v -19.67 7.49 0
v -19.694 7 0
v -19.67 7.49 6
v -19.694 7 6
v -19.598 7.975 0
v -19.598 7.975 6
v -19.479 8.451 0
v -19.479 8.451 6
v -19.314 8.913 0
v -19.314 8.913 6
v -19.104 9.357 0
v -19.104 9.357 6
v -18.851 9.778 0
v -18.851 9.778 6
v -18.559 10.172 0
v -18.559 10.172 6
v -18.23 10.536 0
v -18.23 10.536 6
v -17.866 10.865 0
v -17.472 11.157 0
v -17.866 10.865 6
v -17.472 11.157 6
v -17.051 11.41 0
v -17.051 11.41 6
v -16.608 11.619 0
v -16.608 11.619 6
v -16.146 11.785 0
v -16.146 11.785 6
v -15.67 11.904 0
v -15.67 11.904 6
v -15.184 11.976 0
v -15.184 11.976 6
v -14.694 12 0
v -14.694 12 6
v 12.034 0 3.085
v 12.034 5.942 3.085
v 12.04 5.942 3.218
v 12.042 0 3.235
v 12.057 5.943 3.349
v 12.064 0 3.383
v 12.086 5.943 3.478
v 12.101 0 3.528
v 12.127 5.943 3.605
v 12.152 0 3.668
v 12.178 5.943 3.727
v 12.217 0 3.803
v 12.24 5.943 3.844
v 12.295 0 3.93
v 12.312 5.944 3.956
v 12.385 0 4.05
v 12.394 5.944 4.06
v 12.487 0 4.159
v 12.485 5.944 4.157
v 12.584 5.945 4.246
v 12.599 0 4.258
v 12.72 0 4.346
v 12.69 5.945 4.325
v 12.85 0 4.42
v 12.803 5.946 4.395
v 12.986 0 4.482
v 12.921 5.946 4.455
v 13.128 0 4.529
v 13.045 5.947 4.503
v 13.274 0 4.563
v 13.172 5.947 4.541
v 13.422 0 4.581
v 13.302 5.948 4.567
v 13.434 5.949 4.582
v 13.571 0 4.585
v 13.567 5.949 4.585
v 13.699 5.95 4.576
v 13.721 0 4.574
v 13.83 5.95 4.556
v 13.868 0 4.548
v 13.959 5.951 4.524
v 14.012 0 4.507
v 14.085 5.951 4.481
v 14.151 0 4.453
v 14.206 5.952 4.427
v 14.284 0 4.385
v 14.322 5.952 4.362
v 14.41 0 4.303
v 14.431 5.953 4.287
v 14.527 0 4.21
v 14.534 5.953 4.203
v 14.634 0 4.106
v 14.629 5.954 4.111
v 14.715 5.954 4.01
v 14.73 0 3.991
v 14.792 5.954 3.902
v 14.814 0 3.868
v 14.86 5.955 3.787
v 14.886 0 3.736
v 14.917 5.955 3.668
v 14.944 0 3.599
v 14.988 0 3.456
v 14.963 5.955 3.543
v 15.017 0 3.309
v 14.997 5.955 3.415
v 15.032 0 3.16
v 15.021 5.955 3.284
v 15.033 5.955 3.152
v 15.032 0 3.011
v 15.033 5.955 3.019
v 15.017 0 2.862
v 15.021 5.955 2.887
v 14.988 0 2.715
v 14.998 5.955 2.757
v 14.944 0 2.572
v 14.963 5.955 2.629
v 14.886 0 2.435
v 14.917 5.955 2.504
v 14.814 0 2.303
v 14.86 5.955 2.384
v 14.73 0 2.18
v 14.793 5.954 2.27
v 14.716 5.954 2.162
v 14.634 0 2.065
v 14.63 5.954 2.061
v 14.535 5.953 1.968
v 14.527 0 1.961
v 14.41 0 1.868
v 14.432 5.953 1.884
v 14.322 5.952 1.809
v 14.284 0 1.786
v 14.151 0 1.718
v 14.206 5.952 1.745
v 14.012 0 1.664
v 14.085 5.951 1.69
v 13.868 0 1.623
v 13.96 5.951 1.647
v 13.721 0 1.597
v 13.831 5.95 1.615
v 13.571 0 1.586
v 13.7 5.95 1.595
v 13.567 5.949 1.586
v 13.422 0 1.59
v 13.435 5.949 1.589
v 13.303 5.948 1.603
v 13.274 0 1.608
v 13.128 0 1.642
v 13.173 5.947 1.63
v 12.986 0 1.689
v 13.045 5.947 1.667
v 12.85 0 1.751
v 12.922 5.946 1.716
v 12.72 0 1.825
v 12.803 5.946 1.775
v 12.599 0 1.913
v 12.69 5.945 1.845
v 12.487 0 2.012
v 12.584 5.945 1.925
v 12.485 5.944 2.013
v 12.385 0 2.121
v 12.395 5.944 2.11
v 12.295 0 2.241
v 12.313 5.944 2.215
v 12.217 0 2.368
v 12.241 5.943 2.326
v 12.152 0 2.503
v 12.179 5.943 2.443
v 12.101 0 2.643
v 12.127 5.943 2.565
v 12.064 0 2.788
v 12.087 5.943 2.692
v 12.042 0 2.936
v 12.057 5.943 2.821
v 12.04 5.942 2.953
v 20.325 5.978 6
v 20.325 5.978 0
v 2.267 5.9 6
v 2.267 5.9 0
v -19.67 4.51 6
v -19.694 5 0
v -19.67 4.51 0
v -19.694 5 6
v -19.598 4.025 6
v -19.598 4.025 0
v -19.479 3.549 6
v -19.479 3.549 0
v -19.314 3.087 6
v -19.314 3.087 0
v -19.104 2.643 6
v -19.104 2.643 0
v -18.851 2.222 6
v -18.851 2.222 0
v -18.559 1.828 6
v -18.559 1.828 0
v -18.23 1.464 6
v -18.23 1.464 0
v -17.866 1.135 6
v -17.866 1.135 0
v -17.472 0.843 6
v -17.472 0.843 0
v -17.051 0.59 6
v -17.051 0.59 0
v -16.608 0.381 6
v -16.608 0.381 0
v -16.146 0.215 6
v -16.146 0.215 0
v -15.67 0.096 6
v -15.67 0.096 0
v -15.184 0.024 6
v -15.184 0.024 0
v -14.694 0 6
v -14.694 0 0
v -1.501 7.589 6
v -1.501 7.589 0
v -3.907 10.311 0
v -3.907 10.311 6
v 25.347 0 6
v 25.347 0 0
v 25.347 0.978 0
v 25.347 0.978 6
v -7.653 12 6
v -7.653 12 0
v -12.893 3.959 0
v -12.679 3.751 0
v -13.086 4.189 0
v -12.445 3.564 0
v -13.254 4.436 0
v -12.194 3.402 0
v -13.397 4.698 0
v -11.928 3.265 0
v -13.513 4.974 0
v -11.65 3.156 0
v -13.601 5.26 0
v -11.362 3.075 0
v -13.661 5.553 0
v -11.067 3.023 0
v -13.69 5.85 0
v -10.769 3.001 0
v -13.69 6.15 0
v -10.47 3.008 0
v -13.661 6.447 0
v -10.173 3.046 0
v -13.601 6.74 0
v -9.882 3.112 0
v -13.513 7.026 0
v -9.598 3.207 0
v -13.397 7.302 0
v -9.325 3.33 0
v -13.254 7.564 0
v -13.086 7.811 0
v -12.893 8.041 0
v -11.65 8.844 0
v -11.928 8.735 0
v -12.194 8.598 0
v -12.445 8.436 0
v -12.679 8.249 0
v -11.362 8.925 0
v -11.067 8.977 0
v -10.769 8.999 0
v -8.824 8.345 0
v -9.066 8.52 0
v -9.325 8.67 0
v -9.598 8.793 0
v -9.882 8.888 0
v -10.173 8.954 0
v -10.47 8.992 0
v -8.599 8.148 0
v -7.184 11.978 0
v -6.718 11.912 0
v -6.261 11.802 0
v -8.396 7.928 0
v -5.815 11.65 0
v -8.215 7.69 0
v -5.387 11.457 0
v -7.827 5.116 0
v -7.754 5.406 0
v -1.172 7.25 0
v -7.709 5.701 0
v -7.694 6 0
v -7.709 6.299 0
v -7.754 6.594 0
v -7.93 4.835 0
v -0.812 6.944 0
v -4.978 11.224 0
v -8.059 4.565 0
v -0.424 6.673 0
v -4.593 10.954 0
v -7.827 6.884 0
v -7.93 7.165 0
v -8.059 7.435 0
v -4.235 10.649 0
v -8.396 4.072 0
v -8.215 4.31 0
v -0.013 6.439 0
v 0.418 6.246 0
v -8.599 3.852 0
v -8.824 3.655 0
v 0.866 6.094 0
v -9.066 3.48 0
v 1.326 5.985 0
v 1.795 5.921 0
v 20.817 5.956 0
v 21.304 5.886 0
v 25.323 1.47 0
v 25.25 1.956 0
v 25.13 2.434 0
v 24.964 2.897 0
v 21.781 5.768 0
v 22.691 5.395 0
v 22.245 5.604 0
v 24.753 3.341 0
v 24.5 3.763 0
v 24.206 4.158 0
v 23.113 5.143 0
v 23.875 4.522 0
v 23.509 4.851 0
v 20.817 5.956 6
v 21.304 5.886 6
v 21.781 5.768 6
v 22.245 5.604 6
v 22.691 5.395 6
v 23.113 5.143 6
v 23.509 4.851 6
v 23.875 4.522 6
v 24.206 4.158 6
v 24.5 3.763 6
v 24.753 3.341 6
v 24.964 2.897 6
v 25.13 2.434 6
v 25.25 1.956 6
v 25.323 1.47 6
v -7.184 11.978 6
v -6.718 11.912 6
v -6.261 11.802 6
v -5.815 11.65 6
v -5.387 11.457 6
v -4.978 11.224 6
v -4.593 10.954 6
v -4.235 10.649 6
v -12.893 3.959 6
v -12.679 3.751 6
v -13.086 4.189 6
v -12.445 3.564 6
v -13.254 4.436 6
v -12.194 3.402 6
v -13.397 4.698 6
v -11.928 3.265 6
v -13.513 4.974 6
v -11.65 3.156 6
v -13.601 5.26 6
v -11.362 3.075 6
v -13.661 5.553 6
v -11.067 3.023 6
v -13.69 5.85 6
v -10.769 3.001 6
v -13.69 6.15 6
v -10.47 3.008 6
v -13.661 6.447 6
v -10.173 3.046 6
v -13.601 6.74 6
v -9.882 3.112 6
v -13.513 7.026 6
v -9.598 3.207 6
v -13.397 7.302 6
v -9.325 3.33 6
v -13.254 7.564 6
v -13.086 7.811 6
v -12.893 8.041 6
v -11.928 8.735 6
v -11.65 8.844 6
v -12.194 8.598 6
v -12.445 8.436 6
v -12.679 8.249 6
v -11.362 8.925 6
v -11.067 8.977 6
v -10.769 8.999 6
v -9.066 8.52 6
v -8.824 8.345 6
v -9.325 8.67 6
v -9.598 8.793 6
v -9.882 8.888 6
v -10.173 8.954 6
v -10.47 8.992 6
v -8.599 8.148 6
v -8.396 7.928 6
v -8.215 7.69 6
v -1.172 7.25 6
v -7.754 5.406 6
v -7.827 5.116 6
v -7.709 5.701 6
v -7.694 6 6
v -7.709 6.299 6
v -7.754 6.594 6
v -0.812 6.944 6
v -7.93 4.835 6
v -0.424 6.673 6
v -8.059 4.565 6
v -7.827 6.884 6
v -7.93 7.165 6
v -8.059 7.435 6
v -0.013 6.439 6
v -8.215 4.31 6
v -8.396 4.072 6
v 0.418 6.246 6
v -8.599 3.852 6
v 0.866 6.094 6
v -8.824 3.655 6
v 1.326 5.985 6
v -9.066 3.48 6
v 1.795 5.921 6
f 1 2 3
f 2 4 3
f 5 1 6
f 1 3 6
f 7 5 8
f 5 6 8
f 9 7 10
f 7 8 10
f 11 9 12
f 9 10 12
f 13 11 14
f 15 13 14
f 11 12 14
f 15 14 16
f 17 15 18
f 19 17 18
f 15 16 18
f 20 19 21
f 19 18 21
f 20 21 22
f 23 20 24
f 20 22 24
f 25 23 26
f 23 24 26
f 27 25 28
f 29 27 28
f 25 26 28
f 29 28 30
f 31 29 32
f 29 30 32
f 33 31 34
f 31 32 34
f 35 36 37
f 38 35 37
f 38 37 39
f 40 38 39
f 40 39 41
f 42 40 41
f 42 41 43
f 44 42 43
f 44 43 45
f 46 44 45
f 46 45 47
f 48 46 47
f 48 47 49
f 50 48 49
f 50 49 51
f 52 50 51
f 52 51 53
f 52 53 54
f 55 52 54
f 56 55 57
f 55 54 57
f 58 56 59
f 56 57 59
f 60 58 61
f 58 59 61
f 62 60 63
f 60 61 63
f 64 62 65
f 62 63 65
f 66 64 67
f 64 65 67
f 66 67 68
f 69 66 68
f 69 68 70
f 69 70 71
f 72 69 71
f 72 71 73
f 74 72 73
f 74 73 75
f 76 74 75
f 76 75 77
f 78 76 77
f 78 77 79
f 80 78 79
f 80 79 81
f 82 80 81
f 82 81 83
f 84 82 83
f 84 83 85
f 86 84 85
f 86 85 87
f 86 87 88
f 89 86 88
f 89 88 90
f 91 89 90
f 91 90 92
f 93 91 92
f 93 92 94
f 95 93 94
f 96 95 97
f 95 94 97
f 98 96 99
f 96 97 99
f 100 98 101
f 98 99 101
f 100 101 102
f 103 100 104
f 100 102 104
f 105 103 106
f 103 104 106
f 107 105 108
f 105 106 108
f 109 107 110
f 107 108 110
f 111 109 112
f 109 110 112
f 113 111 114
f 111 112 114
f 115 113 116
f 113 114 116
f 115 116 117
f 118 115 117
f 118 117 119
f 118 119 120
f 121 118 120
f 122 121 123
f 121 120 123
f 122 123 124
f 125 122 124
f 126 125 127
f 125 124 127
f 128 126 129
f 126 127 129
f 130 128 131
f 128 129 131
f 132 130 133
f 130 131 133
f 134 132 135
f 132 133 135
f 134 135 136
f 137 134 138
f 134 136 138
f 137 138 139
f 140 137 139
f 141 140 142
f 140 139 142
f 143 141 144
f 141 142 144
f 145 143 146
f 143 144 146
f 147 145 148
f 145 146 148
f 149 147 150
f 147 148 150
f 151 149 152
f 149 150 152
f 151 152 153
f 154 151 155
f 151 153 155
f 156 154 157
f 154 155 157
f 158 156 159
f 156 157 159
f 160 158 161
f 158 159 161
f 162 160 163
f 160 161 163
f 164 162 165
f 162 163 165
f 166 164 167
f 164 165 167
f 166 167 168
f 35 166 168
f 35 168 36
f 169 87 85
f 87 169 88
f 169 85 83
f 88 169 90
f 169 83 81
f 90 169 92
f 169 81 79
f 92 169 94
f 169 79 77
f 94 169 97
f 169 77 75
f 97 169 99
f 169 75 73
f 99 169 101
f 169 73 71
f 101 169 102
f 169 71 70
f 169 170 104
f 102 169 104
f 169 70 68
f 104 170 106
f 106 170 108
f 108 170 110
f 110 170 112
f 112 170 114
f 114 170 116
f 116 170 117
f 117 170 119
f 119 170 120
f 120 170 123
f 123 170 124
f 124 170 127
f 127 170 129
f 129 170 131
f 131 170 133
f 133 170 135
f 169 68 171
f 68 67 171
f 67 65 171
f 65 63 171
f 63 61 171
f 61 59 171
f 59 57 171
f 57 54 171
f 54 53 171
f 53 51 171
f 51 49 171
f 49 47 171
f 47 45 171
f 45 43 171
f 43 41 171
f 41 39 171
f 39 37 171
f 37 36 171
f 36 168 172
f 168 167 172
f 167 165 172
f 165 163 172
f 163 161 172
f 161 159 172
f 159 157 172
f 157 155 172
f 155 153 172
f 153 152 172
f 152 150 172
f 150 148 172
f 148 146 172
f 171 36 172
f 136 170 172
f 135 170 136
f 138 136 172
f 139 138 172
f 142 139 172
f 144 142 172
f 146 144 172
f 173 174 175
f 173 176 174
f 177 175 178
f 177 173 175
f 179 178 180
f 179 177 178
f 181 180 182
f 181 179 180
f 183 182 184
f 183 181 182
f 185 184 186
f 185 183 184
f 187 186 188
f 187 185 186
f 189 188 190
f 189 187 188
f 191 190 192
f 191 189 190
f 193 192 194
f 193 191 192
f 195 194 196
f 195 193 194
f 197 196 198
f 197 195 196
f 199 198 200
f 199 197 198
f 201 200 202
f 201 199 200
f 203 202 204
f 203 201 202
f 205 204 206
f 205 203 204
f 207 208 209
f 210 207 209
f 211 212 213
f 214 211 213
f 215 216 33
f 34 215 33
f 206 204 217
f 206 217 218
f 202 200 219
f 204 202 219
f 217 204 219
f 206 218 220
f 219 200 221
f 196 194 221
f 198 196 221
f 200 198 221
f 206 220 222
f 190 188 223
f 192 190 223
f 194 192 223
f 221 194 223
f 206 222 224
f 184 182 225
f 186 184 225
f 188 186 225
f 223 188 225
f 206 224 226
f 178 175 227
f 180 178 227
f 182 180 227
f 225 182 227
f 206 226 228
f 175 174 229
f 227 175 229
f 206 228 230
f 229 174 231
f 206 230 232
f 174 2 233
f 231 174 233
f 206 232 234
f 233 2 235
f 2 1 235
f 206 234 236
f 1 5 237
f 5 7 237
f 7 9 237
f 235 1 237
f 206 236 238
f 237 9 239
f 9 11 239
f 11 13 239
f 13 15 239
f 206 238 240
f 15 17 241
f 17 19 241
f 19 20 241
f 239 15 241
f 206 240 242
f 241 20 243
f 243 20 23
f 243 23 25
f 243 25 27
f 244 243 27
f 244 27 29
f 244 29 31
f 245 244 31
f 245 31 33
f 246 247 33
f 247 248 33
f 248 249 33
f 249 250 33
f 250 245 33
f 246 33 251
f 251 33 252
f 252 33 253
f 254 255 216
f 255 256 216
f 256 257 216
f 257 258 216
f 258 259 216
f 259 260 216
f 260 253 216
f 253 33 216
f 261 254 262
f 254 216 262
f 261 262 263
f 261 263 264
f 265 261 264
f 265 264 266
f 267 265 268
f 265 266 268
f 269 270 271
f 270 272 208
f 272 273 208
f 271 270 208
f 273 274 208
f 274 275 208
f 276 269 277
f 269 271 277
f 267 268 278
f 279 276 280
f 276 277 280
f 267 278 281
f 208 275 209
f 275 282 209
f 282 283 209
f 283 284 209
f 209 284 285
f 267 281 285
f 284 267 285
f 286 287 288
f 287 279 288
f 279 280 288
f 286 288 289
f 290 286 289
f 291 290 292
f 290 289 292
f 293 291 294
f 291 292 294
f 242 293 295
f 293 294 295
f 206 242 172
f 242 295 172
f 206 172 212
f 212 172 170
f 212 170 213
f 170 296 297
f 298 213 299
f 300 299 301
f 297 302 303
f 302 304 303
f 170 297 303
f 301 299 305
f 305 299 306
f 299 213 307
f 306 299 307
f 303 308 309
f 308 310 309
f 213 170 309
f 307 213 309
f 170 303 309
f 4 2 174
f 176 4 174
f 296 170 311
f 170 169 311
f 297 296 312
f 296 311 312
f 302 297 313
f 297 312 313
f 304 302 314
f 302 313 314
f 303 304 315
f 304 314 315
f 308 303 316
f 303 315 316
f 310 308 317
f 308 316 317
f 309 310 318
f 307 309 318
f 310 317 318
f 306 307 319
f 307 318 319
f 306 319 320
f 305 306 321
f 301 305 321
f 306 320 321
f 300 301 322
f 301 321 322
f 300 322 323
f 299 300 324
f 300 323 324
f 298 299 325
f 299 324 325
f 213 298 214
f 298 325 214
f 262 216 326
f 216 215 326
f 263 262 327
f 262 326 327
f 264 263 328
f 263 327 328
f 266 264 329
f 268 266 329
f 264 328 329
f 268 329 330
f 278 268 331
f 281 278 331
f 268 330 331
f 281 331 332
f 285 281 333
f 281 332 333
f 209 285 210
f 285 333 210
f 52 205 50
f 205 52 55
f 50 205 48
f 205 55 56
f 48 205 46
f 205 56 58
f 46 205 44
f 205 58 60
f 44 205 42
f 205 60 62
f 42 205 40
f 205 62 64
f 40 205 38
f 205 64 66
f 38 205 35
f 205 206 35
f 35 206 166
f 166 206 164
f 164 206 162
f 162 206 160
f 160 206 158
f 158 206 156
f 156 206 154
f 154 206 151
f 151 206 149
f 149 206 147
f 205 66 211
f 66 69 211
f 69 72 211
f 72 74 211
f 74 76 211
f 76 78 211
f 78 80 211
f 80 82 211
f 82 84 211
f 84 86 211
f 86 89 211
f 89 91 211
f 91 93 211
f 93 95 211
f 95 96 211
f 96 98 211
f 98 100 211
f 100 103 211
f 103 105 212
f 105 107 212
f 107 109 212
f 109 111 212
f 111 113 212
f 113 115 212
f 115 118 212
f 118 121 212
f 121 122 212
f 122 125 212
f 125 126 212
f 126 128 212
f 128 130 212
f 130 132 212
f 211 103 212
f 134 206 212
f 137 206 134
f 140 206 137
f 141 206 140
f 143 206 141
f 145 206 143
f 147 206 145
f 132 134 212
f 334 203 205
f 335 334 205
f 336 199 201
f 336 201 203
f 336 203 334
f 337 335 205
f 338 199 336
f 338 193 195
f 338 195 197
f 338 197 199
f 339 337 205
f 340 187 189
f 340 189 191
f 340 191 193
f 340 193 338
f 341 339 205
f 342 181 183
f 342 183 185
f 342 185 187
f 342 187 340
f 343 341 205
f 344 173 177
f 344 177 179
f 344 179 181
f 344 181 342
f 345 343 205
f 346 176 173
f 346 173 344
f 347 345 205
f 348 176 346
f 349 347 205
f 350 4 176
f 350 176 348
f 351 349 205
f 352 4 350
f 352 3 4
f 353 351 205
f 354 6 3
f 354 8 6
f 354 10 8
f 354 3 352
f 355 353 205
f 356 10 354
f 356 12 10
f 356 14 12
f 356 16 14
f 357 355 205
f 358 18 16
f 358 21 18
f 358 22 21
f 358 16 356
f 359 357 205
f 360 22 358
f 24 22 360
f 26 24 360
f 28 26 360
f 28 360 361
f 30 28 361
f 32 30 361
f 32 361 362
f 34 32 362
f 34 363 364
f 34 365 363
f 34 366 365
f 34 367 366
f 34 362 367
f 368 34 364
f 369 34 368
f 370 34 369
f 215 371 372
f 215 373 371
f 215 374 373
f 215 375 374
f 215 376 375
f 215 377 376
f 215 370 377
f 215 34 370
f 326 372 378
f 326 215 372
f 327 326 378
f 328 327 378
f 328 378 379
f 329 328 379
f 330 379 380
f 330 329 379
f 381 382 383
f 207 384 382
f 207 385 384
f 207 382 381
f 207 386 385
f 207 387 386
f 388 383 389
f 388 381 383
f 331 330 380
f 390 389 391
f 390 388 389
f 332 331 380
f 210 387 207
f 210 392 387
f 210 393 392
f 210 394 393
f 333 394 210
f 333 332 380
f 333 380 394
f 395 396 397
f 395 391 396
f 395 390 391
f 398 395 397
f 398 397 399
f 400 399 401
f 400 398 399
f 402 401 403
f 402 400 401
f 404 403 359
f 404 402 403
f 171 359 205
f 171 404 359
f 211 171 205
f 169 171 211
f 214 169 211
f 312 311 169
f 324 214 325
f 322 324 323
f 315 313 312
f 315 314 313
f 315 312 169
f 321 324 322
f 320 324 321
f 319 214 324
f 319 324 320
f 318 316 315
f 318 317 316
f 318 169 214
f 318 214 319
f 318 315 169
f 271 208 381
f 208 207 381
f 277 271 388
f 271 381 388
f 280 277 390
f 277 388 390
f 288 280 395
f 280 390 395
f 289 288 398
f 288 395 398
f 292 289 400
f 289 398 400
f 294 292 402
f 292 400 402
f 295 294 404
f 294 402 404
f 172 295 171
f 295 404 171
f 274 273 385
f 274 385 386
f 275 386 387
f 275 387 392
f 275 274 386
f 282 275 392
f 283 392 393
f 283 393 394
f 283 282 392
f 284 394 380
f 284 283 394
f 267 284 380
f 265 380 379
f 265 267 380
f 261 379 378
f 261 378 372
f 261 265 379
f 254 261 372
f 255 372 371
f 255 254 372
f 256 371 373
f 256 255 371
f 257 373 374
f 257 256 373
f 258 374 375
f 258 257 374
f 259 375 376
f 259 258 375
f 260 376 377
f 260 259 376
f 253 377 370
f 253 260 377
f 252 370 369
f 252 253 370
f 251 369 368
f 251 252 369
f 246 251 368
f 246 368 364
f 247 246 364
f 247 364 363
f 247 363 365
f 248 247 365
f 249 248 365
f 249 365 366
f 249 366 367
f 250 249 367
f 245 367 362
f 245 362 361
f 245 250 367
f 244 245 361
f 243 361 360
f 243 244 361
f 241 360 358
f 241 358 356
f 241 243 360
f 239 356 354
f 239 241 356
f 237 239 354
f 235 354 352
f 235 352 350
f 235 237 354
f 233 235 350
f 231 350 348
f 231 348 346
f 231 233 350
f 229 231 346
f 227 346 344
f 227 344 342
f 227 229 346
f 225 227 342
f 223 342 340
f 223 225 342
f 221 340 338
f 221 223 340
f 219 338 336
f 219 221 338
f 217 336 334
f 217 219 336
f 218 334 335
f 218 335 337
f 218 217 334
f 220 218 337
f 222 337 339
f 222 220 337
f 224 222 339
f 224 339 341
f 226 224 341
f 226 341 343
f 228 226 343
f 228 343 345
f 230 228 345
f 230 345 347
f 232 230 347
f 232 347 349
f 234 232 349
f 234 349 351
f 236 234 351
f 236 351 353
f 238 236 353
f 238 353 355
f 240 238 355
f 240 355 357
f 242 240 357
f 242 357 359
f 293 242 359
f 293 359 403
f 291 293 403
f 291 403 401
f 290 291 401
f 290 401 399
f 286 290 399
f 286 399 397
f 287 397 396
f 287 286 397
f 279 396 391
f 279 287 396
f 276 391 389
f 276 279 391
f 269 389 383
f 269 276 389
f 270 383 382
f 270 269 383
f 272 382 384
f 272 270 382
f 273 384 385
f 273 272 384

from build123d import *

# Parameters (mm, degrees)
F0_R     = 3
F2_DEPTH = 6
F3_D     = 3
F4_R     = 5
F5_R     = 5
F6_R     = 5
F7_R     = 5


with BuildPart() as f2:
    # F0 (on Top) → F2 (new body)
    with BuildSketch(Plane.XY):
        Polygon((-19.694119, 12), (-19.694119, 0), (25.346741, 0), (25.346741, 6), (0, 5.890472), (-5.3996, 12), align=None)
        with Locations((-10.694119, 6)):
            Circle(F0_R, mode=Mode.SUBTRACT)
    extrude(amount=F2_DEPTH)

    # F3 (through all)
    with Locations(Plane.XZ):
        with Locations((13.534061, 3.085485)):
            Hole(F3_D / 2)

    # F4
    f4_edges = [f2.edges().sort_by_distance(p)[0] for p in [
        (-19.694119, 12, 3),
        (-19.694119, 0, 3),
    ]]
    fillet(f4_edges, radius=F4_R)

    # F5
    f5_edges = [f2.edges().sort_by_distance(p)[0] for p in [
        (-5.3996, 12, 3),
    ]]
    fillet(f5_edges, radius=F5_R)

    # F6
    f6_edges = [f2.edges().sort_by_distance(p)[0] for p in [
        (0, 5.890472, 3),
    ]]
    fillet(f6_edges, radius=F6_R)

    # F7
    f7_edges = [f2.edges().sort_by_distance(p)[0] for p in [
        (25.346741, 6, 3),
    ]]
    fillet(f7_edges, radius=F7_R)


solid = f2.part
